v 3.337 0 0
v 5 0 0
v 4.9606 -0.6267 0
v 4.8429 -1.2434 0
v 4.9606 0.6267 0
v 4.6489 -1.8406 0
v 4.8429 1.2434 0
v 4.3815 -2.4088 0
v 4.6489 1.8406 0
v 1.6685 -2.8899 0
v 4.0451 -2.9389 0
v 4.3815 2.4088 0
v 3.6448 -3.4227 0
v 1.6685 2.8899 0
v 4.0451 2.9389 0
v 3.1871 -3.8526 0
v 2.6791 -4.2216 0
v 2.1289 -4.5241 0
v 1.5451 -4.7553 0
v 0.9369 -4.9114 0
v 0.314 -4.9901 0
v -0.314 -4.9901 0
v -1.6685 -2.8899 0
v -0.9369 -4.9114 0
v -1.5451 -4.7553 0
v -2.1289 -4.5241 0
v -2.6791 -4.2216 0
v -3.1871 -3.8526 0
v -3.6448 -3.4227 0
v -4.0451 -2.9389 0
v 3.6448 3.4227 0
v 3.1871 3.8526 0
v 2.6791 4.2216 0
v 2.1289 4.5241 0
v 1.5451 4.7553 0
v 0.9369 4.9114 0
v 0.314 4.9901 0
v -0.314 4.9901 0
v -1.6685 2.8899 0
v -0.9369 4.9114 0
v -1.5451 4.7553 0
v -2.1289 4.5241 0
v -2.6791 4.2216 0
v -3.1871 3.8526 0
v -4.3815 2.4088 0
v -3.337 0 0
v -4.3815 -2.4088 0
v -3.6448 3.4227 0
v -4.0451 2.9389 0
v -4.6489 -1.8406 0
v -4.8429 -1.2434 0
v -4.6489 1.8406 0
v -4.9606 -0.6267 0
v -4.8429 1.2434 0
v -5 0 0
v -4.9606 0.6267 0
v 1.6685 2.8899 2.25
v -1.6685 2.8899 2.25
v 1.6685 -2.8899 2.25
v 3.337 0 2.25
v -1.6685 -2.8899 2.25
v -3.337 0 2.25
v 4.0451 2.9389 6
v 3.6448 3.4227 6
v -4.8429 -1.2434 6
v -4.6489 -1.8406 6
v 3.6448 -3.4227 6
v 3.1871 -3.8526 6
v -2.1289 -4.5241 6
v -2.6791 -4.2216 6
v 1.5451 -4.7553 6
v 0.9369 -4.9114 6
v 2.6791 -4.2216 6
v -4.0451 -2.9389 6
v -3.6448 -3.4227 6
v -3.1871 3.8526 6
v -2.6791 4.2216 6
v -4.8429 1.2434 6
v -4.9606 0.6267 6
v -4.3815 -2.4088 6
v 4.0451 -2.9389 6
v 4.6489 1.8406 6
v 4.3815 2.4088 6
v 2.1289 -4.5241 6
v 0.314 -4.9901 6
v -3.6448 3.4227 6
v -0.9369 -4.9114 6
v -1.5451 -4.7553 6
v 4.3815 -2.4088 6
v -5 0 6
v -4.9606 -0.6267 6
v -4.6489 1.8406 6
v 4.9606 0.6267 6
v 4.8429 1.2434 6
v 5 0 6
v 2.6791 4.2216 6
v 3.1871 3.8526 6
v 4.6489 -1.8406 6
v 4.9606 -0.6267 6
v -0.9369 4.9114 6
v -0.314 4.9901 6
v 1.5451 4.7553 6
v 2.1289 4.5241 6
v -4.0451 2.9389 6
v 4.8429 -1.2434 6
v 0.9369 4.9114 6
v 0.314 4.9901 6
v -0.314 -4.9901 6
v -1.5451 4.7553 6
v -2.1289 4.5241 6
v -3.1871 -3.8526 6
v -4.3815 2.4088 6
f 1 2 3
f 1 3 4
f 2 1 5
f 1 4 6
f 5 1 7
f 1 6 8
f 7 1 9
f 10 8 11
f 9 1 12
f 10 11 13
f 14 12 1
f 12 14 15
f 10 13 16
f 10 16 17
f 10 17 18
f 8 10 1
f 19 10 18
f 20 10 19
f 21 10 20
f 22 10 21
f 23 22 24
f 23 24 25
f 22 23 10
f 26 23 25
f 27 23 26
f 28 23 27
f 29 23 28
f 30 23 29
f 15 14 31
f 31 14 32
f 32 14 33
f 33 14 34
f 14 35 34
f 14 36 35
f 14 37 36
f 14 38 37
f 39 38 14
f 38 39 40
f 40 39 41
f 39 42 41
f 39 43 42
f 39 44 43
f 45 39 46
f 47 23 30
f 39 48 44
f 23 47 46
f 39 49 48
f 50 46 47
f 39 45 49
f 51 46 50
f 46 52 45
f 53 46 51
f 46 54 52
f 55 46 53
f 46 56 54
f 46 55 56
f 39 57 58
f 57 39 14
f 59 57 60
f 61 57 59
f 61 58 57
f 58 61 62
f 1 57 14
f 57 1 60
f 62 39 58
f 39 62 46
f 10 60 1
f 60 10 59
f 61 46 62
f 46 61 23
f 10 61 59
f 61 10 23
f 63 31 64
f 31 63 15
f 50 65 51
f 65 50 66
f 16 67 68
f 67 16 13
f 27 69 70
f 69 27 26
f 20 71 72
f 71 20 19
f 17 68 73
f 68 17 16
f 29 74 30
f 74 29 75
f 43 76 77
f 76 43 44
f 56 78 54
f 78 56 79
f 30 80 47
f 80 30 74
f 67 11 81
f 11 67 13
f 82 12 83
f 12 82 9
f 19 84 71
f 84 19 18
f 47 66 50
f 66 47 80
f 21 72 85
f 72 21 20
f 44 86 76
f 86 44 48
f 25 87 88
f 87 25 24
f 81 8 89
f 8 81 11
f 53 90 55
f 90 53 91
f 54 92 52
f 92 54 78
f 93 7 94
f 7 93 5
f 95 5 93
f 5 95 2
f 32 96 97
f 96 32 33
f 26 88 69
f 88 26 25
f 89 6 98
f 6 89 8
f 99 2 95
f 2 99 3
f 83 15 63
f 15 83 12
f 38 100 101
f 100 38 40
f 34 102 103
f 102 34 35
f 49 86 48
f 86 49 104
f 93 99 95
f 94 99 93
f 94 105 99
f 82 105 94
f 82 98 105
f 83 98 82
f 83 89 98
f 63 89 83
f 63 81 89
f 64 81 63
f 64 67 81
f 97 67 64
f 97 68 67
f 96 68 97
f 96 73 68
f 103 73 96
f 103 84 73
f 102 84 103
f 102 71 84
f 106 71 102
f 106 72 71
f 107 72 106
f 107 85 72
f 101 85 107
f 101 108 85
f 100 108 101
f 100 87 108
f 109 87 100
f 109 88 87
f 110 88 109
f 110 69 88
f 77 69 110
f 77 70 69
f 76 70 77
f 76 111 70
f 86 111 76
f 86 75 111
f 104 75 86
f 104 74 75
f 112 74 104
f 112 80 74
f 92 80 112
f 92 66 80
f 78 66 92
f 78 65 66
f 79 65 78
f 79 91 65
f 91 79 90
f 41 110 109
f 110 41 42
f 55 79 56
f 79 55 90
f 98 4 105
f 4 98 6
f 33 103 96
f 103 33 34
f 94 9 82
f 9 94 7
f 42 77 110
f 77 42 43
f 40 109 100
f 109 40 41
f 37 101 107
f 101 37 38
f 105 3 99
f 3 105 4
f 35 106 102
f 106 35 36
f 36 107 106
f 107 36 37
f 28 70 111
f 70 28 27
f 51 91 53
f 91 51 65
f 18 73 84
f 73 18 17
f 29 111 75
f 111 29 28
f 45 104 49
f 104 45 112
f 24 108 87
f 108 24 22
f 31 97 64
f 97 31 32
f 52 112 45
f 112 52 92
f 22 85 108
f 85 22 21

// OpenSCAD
$fn = 50;


difference() {
	union() {
		hull() {
			cylinder(h = 6, r = 5);
			cylinder(h = 6, r = 5);
			cylinder(h = 6, r = 5);
			cylinder(h = 6, r = 5);
		}
	}
	union() {
		translate(v = [0, 0, 0]) {
			rotate(a = [0, 0, 0]) {
				difference() {
					union() {
						linear_extrude(height = 2.2500000000) {
							polygon(points = [[3.3370000000, 0.0000000000], [1.6685000000, 2.8899267724], [-1.6685000000, 2.8899267724], [-3.3370000000, 0.0000000000], [-1.6685000000, -2.8899267724], [1.6685000000, -2.8899267724]]);
						}
					}
					union();
				}
			}
		}
	}
}
